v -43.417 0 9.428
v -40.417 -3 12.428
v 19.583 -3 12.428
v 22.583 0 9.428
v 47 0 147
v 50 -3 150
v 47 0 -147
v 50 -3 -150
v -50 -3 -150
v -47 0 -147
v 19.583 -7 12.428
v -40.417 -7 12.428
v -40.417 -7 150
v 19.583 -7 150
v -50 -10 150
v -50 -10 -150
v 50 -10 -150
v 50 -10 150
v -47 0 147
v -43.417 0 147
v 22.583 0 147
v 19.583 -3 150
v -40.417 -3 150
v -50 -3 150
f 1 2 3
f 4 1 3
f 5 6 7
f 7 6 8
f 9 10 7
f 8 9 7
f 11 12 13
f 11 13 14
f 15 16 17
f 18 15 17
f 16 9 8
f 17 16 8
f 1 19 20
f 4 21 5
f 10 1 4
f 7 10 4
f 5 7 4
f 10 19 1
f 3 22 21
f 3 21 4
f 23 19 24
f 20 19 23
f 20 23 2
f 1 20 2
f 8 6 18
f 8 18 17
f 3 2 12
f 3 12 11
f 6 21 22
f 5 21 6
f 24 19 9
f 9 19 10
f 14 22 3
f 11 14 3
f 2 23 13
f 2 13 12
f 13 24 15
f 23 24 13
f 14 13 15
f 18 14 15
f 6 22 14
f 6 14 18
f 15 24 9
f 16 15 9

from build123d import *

# Parameters (mm, degrees)
SKETCH1_W           = 100
SKETCH1_H           = 300
BOSS_EXTRUDE1_DEPTH = 10
SKETCH2_W           = 60
SKETCH2_H           = 137.571747247
CUT_EXTRUDE1_DEPTH  = 7
CHAMFER1_SIZE       = 3


with BuildPart() as part:
    # Sketch1 → Boss-Extrude1 (new body)
    with BuildSketch(Plane(origin=(0, 0, 0), x_dir=(1, 0, 0), z_dir=(0, 1, 0))):
        Rectangle(SKETCH1_W, SKETCH1_H)
    extrude(amount=-BOSS_EXTRUDE1_DEPTH)

    # Sketch2 → Cut-Extrude1 (cut)
    with BuildSketch(Plane(origin=(0, 0, 0), x_dir=(1, 0, 0), z_dir=(0, 1, 0))):
        with Locations((-10.417468157, -81.214126377)):
            Rectangle(SKETCH2_W, SKETCH2_H)
    extrude(amount=-CUT_EXTRUDE1_DEPTH, mode=Mode.SUBTRACT)

    # Chamfer1
    chamfer1_edges = [part.edges().sort_by_distance(p)[0] for p in [
        (34.791265922, 0, 150),
        (19.582531843, 0, 81.214126377),
        (-10.417468157, 0, 12.428252753),
        (-40.417468157, 0, 81.214126377),
        (0, 0, -150),
        (50, 0, 0),
        (-45.208734078, 0, 150),
        (-50, 0, 0),
    ]]
    chamfer(chamfer1_edges, length=CHAMFER1_SIZE)


solid = part.part
